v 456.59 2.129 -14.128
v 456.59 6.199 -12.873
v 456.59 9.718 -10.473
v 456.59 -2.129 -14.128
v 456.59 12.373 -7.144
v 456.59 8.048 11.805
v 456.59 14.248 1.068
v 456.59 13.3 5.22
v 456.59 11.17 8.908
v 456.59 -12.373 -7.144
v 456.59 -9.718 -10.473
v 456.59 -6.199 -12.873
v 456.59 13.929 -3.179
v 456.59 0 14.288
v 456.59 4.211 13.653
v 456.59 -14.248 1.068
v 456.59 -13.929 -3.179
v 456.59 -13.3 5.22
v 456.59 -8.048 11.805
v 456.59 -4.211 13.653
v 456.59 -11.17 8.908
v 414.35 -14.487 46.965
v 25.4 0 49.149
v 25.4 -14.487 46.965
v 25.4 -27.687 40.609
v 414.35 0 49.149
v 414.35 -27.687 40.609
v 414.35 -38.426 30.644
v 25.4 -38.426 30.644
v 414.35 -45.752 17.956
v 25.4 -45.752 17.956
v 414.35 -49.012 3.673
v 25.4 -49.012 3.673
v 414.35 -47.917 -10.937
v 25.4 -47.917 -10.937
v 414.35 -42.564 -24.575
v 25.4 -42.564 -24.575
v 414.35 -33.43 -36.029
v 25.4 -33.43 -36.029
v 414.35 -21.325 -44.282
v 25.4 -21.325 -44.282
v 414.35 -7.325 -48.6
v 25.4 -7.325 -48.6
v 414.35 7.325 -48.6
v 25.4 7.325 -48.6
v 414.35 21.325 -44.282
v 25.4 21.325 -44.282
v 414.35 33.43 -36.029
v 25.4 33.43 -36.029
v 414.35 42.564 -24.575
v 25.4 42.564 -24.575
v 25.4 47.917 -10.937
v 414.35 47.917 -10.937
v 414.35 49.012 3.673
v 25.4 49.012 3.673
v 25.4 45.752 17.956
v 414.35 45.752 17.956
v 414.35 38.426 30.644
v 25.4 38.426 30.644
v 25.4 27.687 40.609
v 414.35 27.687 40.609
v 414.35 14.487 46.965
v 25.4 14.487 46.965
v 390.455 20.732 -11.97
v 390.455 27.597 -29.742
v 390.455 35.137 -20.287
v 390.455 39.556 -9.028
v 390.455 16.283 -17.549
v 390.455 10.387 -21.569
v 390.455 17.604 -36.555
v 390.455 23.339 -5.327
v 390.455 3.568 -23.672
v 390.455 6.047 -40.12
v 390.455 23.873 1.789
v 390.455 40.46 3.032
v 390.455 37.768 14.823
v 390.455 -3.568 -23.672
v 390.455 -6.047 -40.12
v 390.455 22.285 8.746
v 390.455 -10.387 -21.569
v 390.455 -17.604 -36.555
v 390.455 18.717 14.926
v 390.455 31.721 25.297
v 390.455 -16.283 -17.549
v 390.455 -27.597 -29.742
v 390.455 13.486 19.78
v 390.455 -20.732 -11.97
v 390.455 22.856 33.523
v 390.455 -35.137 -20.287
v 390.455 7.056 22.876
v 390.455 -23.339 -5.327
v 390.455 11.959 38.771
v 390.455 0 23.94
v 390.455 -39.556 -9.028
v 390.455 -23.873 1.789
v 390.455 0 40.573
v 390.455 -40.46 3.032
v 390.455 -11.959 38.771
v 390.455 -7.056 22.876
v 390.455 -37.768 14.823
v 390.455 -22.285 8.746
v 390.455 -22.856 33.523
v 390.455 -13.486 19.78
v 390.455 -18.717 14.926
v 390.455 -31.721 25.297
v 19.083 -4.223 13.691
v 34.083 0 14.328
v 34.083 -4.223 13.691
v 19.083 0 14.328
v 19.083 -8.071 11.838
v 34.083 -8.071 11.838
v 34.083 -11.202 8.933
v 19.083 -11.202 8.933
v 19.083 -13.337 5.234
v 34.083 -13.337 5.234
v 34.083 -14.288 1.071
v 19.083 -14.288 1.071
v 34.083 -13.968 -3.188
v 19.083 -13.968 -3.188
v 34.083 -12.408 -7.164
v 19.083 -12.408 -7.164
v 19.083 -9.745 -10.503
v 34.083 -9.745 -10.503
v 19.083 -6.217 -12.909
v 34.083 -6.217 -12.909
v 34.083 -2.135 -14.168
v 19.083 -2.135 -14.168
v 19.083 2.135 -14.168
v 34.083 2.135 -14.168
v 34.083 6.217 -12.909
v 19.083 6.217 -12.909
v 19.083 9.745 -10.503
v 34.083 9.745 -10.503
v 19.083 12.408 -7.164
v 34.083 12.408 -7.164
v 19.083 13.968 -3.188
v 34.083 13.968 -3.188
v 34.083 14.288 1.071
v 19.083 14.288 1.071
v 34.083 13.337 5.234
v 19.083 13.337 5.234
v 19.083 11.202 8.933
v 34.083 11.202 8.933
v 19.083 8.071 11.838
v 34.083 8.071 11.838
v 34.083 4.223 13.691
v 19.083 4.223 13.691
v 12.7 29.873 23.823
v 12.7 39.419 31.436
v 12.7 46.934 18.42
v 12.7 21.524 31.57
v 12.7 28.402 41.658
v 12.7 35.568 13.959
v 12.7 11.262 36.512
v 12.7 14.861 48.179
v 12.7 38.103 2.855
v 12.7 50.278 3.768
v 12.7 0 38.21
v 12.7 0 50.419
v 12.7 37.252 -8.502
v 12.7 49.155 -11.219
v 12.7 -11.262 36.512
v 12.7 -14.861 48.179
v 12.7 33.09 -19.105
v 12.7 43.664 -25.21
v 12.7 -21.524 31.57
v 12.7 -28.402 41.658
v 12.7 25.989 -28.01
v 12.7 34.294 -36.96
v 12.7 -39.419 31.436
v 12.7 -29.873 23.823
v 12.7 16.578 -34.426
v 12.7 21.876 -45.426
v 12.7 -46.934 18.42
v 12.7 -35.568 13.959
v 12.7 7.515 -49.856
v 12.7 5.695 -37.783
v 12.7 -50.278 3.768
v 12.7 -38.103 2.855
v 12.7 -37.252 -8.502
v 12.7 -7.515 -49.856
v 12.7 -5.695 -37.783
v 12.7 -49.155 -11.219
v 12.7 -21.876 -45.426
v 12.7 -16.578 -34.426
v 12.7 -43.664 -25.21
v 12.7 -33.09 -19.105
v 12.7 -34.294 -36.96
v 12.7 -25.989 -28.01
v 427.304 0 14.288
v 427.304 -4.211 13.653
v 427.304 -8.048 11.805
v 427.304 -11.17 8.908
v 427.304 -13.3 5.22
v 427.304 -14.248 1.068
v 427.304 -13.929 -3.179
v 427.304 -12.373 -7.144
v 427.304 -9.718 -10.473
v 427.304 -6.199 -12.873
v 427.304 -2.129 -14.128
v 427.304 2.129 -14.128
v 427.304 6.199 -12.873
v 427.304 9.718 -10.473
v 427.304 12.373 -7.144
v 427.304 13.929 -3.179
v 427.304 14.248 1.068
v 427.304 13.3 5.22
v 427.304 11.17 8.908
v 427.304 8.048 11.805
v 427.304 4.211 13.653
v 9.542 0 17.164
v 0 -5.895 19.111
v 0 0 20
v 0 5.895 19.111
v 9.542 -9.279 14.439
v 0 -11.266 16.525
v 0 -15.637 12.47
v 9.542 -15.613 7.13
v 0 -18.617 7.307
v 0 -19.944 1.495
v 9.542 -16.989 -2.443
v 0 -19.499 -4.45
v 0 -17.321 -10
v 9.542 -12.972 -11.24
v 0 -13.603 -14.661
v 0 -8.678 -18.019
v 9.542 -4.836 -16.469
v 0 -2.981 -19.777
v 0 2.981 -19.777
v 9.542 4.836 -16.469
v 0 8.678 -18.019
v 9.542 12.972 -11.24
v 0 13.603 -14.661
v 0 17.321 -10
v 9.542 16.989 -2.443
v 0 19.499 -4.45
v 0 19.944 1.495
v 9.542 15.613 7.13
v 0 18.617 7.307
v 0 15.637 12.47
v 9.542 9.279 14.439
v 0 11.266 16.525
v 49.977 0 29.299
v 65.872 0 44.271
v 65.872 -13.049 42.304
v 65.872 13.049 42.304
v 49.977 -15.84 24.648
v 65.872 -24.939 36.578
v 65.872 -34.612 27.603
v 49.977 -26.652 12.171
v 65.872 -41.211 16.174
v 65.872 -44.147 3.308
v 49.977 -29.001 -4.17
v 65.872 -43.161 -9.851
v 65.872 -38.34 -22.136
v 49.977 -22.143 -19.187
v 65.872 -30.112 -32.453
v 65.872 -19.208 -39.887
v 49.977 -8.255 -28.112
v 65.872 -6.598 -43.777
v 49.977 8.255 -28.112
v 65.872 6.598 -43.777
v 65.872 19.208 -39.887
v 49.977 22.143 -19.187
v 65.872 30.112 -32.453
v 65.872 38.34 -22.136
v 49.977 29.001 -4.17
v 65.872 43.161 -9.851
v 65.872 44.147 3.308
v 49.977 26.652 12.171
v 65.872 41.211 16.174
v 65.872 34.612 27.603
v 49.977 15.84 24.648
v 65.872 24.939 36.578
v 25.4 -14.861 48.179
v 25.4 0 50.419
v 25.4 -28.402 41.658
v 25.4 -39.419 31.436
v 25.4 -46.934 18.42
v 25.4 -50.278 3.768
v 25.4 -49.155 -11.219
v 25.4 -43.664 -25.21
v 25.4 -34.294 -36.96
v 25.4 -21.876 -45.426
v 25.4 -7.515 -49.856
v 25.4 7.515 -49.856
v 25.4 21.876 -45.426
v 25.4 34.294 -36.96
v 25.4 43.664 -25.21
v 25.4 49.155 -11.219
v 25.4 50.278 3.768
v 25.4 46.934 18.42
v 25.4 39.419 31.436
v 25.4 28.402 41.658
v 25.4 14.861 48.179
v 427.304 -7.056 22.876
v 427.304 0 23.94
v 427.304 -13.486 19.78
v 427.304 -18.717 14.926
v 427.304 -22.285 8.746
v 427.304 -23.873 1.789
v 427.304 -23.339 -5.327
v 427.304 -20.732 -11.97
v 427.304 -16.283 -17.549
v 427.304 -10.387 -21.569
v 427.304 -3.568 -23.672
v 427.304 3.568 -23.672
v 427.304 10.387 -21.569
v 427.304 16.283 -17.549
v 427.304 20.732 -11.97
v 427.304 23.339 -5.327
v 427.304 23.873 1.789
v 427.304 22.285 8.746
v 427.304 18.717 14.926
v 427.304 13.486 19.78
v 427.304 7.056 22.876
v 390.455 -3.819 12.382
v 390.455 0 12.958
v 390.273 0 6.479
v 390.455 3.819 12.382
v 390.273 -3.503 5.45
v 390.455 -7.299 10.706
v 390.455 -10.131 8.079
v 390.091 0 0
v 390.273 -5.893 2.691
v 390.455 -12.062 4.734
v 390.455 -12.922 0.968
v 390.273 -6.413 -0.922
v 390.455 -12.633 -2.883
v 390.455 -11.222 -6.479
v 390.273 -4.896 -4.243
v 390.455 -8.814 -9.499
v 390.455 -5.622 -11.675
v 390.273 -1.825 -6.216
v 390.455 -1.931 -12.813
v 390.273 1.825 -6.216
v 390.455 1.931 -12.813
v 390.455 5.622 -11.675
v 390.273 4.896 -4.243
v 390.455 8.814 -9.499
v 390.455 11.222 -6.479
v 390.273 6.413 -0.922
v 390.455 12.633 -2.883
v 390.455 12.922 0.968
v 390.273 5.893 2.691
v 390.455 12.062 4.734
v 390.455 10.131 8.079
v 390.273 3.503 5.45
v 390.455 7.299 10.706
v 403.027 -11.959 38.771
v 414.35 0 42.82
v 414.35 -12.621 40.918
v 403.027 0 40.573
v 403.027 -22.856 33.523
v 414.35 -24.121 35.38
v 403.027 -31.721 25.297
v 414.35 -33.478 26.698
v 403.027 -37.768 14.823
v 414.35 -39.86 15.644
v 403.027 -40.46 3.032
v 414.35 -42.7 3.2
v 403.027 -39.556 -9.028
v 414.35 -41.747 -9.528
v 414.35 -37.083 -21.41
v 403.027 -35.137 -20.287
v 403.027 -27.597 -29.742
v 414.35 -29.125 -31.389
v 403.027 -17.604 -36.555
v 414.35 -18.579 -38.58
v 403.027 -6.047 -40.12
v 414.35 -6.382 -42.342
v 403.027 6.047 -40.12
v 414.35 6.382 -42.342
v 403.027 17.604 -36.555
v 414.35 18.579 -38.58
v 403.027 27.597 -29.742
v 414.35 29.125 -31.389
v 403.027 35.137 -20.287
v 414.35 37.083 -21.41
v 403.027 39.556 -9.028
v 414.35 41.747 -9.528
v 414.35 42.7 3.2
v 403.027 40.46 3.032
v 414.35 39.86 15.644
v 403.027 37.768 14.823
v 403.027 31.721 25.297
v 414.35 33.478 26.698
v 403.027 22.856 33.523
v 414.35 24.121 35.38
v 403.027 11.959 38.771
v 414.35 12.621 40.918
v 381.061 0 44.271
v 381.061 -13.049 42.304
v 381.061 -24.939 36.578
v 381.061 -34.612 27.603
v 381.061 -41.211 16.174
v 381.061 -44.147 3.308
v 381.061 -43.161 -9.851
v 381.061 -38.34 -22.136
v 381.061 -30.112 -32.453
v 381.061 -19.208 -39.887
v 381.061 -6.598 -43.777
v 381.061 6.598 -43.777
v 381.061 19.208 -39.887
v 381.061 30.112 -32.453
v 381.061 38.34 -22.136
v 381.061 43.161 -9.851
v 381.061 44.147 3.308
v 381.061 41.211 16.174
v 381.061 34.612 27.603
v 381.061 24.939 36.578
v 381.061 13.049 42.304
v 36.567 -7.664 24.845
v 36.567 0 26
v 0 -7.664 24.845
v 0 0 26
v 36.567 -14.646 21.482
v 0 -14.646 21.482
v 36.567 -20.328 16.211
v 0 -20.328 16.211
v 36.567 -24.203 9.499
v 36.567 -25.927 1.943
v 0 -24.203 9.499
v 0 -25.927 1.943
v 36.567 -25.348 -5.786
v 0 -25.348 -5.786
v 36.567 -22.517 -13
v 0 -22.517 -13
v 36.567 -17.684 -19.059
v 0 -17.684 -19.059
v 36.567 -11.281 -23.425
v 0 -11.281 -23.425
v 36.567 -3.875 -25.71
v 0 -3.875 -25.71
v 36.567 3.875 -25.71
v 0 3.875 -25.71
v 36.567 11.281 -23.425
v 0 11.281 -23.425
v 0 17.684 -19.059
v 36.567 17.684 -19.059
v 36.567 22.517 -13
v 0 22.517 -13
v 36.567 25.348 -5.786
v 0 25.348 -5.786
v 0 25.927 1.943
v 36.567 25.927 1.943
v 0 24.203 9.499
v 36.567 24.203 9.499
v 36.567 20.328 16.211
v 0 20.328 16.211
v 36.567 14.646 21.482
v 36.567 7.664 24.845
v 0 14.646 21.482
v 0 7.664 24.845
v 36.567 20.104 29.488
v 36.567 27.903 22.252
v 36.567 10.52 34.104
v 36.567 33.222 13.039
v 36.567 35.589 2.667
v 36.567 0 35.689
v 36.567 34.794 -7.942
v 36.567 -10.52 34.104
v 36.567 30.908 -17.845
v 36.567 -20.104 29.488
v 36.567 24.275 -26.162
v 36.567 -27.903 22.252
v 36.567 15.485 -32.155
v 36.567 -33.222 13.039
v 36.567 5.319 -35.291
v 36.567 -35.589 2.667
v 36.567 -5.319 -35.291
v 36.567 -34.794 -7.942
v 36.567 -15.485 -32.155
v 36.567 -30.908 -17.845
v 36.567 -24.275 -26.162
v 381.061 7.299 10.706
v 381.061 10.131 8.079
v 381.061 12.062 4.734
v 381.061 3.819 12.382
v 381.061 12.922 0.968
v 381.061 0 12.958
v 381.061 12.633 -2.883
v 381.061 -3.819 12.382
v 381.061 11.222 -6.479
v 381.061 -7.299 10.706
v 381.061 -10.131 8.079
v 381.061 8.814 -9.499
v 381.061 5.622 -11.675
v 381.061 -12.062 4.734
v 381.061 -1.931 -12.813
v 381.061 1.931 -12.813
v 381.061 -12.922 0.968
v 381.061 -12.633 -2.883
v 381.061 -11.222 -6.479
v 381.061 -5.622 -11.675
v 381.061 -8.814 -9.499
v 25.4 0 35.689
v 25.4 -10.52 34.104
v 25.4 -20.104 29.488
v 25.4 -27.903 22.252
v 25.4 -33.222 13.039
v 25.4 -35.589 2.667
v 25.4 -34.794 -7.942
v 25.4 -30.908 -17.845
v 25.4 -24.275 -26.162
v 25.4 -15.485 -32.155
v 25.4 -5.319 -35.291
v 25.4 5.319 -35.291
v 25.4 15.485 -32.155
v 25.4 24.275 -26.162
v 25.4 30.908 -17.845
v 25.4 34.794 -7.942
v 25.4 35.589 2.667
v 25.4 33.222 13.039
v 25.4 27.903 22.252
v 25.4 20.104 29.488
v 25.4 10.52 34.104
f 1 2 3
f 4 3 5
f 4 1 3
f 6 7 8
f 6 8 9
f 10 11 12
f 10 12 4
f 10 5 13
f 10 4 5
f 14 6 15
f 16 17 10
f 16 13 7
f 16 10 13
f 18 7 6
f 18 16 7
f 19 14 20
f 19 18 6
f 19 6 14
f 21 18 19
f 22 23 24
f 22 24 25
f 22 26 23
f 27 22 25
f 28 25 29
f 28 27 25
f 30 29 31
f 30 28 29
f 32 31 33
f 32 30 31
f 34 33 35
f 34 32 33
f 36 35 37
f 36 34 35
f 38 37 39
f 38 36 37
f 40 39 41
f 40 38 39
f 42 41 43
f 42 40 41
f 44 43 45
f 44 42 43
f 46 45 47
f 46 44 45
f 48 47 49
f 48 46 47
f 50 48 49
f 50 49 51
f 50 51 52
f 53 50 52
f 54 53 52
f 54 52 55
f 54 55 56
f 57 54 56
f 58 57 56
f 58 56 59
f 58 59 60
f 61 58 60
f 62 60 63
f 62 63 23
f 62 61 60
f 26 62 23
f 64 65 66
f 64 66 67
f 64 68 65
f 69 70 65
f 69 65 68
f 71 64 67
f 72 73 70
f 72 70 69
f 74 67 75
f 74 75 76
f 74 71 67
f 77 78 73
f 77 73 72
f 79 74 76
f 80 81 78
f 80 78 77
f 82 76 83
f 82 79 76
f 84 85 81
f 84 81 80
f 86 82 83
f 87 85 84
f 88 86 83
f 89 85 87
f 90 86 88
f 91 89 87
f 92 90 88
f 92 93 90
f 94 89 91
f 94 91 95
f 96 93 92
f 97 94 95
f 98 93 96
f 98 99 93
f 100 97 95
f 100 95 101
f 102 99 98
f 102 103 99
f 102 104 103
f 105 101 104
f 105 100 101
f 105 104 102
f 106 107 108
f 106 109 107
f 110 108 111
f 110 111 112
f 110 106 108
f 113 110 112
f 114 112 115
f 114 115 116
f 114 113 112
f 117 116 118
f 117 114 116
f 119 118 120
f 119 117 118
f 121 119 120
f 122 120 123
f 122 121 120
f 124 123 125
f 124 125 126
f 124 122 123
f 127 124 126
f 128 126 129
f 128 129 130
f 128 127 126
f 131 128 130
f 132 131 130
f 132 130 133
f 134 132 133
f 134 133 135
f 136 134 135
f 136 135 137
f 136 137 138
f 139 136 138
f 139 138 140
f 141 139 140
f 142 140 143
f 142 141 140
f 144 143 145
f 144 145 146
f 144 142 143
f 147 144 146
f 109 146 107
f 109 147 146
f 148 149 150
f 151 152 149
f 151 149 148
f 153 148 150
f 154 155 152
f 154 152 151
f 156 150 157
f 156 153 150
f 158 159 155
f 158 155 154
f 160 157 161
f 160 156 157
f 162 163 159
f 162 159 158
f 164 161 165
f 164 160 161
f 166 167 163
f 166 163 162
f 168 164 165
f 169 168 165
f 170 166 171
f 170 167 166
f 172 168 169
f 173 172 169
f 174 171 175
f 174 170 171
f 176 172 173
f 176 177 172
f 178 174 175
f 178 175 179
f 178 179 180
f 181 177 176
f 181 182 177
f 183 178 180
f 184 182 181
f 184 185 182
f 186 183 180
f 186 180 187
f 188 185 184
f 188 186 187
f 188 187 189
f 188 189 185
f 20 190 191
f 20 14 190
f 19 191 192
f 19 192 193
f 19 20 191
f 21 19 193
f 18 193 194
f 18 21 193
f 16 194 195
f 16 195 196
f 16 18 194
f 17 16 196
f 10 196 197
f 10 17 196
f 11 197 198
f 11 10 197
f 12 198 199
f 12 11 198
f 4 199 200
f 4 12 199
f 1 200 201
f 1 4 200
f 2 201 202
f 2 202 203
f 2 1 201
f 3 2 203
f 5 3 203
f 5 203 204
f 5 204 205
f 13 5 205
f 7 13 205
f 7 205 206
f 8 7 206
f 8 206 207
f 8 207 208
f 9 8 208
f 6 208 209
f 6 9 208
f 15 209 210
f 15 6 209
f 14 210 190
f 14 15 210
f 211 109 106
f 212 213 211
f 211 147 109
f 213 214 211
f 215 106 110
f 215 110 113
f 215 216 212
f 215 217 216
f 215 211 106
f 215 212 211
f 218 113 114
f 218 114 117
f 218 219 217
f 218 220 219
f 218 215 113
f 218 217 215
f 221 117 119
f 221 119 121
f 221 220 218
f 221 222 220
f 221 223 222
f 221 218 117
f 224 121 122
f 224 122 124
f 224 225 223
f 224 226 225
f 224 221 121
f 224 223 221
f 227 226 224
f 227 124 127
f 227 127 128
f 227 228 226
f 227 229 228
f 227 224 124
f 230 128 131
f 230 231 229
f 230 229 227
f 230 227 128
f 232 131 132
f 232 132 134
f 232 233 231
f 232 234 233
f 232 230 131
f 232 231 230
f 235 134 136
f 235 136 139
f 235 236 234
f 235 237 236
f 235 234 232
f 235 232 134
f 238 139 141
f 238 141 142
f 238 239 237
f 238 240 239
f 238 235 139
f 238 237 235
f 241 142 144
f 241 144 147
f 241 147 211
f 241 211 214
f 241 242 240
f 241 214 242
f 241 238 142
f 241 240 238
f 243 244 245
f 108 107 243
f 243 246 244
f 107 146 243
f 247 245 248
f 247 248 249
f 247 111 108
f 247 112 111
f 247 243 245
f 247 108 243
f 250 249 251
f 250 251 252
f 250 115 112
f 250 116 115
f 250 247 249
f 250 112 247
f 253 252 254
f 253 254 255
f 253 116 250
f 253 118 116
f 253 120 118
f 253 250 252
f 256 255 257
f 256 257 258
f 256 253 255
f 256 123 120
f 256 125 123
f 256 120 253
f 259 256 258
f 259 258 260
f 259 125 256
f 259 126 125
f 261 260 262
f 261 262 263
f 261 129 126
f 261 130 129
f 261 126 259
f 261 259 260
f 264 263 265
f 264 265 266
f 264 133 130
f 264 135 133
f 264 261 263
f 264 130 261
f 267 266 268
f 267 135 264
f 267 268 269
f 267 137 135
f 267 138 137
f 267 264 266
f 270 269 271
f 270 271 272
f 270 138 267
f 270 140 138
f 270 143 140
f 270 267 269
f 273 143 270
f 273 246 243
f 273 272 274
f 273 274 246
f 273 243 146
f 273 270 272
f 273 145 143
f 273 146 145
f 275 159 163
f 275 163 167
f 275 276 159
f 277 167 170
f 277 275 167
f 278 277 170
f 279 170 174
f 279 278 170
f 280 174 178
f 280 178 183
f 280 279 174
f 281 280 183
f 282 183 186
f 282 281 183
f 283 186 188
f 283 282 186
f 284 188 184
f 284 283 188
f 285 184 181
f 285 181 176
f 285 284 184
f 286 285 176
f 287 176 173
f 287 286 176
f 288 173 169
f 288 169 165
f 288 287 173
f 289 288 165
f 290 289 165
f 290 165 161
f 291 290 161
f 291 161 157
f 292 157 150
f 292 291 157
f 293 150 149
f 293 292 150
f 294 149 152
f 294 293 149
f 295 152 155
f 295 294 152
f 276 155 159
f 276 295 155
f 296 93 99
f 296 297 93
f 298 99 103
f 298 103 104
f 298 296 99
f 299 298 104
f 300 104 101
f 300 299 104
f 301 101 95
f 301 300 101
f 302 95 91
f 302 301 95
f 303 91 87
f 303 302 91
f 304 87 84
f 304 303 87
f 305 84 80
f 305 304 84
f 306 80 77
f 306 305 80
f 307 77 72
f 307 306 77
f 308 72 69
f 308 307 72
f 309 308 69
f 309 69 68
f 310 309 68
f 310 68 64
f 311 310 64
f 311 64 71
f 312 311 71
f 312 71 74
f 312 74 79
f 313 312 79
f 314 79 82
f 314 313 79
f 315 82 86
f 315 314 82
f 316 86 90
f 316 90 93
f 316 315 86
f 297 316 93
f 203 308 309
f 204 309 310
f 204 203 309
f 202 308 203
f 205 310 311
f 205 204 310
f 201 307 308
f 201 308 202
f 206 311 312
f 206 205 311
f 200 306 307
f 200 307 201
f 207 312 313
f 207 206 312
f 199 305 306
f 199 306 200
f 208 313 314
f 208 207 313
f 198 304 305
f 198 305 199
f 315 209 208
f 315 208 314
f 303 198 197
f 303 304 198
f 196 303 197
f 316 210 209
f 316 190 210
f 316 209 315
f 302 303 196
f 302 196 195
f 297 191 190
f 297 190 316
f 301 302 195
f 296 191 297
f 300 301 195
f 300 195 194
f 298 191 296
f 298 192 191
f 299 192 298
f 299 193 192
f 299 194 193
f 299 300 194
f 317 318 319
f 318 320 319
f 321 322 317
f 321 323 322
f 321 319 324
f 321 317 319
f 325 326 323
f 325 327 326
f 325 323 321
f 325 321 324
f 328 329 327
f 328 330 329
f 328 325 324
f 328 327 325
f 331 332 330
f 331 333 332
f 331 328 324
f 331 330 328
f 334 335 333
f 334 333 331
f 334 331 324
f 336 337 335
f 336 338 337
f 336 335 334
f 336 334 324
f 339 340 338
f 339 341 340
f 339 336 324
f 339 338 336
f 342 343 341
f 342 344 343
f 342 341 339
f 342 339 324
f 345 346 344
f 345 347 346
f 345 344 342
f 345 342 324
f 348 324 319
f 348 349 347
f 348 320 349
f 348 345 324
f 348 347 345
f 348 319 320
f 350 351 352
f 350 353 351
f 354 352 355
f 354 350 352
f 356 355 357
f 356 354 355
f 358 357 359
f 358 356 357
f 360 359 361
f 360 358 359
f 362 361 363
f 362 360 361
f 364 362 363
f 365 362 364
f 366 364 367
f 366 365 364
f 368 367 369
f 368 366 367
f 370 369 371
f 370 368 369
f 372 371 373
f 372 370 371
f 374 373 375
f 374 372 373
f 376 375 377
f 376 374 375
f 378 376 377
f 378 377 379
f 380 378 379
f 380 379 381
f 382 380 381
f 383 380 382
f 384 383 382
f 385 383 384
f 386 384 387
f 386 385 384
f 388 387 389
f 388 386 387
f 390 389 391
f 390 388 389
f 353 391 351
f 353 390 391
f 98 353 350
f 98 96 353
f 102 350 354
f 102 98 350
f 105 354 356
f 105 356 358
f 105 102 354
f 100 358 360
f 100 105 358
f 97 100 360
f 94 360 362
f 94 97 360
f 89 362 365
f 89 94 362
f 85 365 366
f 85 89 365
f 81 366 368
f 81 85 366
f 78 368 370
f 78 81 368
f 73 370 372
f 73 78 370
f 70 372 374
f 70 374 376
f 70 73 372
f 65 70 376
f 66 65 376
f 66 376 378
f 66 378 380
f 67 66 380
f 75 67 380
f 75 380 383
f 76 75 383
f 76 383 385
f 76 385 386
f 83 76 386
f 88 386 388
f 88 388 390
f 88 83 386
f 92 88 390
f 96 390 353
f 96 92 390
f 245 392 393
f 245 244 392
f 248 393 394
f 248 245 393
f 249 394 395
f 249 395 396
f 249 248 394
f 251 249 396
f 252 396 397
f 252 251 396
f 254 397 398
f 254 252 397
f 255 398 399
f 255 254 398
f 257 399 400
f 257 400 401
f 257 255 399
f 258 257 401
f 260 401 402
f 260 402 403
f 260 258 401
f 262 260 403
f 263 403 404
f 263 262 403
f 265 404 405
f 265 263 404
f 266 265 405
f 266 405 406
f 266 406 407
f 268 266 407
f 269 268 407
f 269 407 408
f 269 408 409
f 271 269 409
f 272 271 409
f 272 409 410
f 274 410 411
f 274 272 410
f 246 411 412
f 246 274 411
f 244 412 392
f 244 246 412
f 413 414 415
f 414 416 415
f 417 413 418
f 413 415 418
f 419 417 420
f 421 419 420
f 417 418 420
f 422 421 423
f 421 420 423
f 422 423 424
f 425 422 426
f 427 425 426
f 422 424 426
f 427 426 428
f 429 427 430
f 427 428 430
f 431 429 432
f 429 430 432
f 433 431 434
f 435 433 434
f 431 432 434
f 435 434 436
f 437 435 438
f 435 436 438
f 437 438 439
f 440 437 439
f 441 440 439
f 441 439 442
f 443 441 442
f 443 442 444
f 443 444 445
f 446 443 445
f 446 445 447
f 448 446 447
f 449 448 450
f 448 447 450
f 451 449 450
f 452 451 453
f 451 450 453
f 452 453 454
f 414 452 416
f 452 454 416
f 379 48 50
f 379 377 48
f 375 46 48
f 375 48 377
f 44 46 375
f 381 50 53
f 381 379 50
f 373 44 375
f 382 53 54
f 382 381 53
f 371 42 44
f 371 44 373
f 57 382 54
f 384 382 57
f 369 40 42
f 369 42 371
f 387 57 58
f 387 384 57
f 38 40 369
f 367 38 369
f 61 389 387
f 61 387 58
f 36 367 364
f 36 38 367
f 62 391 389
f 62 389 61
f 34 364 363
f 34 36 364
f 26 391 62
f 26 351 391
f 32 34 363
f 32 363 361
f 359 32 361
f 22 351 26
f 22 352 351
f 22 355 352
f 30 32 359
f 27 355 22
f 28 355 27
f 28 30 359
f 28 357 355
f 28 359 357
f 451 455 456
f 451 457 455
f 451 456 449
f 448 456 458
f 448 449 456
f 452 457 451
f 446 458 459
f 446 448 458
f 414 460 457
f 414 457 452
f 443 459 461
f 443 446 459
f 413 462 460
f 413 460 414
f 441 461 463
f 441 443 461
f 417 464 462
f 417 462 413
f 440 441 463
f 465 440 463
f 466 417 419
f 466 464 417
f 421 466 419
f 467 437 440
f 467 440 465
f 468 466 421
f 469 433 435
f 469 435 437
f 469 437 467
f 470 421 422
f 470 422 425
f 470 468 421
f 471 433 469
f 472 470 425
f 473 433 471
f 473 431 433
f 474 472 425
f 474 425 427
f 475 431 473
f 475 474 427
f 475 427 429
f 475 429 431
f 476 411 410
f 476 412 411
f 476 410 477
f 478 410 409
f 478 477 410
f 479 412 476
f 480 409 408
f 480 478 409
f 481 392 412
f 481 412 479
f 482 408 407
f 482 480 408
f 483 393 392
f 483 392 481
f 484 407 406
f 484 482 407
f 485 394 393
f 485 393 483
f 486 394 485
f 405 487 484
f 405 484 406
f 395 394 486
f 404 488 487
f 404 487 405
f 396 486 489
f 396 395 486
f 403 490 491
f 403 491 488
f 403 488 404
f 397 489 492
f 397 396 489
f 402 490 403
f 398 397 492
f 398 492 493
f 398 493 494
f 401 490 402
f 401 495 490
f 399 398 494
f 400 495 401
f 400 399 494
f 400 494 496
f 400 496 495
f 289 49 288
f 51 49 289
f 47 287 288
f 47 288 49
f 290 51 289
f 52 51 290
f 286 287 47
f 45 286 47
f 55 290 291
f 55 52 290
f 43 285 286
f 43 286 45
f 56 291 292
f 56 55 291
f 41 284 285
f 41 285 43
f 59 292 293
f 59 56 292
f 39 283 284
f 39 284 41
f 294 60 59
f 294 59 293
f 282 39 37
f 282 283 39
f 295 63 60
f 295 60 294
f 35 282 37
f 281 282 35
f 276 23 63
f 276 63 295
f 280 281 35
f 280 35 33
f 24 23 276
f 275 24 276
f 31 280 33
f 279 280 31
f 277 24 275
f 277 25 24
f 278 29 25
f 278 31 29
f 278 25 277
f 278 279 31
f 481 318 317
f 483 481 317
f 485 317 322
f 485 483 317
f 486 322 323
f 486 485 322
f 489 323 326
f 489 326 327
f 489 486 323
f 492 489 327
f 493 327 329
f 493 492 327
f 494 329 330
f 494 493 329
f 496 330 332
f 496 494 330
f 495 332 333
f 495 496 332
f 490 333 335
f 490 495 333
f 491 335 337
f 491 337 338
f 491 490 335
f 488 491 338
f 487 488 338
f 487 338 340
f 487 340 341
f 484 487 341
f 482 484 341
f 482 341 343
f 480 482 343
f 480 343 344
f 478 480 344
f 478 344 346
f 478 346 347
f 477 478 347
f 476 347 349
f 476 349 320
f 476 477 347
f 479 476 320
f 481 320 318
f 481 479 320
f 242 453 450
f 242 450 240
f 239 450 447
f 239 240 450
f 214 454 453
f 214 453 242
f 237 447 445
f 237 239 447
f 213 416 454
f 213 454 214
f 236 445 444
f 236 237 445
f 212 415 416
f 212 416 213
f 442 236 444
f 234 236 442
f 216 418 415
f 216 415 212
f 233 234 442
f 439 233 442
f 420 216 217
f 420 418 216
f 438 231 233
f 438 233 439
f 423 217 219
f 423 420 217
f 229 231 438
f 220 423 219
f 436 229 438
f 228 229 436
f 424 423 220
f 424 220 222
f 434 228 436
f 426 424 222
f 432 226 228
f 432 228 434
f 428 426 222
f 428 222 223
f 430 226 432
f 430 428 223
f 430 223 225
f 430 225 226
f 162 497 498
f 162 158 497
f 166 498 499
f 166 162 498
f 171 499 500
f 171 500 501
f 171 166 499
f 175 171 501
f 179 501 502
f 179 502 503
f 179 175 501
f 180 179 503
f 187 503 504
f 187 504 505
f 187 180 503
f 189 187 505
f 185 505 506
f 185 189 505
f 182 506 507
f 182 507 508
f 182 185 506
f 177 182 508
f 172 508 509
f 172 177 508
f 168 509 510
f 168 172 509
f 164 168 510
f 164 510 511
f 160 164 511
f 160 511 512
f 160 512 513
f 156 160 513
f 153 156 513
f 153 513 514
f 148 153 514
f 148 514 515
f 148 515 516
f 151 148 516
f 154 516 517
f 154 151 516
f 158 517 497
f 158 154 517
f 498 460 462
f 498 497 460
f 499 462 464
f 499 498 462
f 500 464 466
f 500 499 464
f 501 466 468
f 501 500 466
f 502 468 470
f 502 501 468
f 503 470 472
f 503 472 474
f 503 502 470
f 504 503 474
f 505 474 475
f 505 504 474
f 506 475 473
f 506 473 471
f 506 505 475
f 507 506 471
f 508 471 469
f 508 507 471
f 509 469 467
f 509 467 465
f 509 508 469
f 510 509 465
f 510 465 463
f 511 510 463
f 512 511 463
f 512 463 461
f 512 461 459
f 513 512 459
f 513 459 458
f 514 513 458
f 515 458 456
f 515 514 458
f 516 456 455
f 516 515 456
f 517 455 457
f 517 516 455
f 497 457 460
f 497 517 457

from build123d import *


with BuildPart() as part:
    # Esquisse2 → Révolution7 (revolve)
    with BuildSketch(Plane.XY, mode=Mode.PRIVATE) as r_volution7_sk:
        Polygon((0, 26), (12.7, 26), (36.56741584, 26), (36.56741584, 35.689138439), (25.4, 35.689138439), (12.7, 38.2095), (12.7, 50.419), (25.4, 50.419), (25.4, 49.149), (414.3502, 49.149), (414.3502, 42.820187711), (403.02734835, 40.573126289), (390.454818395, 40.573126289), (390.454818395, 23.9395), (427.3042, 23.9395), (427.3042, 14.2875), (456.5904, 14.2875), (456.5904, 0), (0, 0), align=None)
    revolve(r_volution7_sk.sketch.rotate(Axis((0, 0, 0), (1, 0, 0)), 90), axis=Axis((0, 0, 0), (1, 0, 0)))

    # Esquisse3 → Enlèvement de matière-Révolution1 (revolve, cut)
    with BuildSketch(Plane.XY, mode=Mode.PRIVATE) as enl_vement_de_mati_re_r_volution1_sk:
        Polygon((0, 20), (0, 0), (390.090795287, 0), (390.454818395, 12.957757221), (381.061065959, 12.957757221), (381.061065959, 44.271024873), (65.871878934, 44.271024873), (34.08300614, 14.327580407), (19.08300614, 14.327580407), align=None)
    revolve(enl_vement_de_mati_re_r_volution1_sk.sketch.rotate(Axis((0, 0, 0), (1, 0, 0)), 90), axis=Axis((0, 0, 0), (1, 0, 0)), mode=Mode.SUBTRACT)


solid = part.part
